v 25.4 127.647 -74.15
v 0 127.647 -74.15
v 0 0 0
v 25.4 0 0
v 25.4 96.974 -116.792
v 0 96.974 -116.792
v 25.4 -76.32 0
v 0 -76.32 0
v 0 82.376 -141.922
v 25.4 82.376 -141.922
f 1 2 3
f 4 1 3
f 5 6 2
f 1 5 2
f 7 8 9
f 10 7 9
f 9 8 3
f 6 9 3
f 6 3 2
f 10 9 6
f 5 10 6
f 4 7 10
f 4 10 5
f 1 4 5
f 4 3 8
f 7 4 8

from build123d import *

# Parameters (mm, degrees)
F1_DEPTH = 25.4


with BuildPart() as f1:
    # F0 (on Right) → F1 (new body)
    with BuildSketch(Plane.YZ):
        Polygon((127.646804, -74.149996), (0, 0), (-76.320149, 0), align=None)
        Polygon((96.973807, -116.791584), (127.646804, -74.149996), (-76.320149, 0), (82.375811, -141.921558), align=None)
    extrude(amount=F1_DEPTH)


solid = f1.part
